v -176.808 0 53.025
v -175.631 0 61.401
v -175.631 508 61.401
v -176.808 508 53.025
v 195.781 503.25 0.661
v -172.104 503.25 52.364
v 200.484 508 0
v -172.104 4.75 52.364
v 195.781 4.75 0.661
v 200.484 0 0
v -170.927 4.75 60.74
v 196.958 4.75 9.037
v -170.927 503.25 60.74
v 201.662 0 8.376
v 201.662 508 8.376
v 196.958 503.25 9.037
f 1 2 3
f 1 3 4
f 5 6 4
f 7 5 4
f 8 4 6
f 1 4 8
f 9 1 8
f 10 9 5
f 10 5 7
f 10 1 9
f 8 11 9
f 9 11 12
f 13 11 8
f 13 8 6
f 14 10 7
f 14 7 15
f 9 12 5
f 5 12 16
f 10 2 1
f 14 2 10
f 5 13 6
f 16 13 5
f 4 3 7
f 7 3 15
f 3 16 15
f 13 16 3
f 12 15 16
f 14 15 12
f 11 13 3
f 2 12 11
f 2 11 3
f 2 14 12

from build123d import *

# Parameters (mm, degrees)
F1_DEPTH = 508
F2_W     = 371.5004
F2_H     = 498.5004
F3_DEPTH = 25.4


with BuildPart() as f1:
    # F0 (on Front) → F1 (new body)
    with BuildSketch(Plane.XZ):
        Polygon((-175.6305839464, 61.4008368448), (-176.807737869, 53.0249514658), (200.4843963216, 0), (201.6615502441, 8.375885379), align=None)
    extrude(amount=-F1_DEPTH)

    # F2 (on face) → F3 (cut)
    with BuildSketch(Plane(origin=(5.0603666747, 0, 36.0063798214), x_dir=(0.9902680687, 0, -0.139173101), z_dir=(0.139173101, 0, 0.9902680687))):
        with Locations((8.0332959582, 254)):
            Rectangle(F2_W, F2_H)
    extrude(amount=-F3_DEPTH, mode=Mode.SUBTRACT)


solid = f1.part
